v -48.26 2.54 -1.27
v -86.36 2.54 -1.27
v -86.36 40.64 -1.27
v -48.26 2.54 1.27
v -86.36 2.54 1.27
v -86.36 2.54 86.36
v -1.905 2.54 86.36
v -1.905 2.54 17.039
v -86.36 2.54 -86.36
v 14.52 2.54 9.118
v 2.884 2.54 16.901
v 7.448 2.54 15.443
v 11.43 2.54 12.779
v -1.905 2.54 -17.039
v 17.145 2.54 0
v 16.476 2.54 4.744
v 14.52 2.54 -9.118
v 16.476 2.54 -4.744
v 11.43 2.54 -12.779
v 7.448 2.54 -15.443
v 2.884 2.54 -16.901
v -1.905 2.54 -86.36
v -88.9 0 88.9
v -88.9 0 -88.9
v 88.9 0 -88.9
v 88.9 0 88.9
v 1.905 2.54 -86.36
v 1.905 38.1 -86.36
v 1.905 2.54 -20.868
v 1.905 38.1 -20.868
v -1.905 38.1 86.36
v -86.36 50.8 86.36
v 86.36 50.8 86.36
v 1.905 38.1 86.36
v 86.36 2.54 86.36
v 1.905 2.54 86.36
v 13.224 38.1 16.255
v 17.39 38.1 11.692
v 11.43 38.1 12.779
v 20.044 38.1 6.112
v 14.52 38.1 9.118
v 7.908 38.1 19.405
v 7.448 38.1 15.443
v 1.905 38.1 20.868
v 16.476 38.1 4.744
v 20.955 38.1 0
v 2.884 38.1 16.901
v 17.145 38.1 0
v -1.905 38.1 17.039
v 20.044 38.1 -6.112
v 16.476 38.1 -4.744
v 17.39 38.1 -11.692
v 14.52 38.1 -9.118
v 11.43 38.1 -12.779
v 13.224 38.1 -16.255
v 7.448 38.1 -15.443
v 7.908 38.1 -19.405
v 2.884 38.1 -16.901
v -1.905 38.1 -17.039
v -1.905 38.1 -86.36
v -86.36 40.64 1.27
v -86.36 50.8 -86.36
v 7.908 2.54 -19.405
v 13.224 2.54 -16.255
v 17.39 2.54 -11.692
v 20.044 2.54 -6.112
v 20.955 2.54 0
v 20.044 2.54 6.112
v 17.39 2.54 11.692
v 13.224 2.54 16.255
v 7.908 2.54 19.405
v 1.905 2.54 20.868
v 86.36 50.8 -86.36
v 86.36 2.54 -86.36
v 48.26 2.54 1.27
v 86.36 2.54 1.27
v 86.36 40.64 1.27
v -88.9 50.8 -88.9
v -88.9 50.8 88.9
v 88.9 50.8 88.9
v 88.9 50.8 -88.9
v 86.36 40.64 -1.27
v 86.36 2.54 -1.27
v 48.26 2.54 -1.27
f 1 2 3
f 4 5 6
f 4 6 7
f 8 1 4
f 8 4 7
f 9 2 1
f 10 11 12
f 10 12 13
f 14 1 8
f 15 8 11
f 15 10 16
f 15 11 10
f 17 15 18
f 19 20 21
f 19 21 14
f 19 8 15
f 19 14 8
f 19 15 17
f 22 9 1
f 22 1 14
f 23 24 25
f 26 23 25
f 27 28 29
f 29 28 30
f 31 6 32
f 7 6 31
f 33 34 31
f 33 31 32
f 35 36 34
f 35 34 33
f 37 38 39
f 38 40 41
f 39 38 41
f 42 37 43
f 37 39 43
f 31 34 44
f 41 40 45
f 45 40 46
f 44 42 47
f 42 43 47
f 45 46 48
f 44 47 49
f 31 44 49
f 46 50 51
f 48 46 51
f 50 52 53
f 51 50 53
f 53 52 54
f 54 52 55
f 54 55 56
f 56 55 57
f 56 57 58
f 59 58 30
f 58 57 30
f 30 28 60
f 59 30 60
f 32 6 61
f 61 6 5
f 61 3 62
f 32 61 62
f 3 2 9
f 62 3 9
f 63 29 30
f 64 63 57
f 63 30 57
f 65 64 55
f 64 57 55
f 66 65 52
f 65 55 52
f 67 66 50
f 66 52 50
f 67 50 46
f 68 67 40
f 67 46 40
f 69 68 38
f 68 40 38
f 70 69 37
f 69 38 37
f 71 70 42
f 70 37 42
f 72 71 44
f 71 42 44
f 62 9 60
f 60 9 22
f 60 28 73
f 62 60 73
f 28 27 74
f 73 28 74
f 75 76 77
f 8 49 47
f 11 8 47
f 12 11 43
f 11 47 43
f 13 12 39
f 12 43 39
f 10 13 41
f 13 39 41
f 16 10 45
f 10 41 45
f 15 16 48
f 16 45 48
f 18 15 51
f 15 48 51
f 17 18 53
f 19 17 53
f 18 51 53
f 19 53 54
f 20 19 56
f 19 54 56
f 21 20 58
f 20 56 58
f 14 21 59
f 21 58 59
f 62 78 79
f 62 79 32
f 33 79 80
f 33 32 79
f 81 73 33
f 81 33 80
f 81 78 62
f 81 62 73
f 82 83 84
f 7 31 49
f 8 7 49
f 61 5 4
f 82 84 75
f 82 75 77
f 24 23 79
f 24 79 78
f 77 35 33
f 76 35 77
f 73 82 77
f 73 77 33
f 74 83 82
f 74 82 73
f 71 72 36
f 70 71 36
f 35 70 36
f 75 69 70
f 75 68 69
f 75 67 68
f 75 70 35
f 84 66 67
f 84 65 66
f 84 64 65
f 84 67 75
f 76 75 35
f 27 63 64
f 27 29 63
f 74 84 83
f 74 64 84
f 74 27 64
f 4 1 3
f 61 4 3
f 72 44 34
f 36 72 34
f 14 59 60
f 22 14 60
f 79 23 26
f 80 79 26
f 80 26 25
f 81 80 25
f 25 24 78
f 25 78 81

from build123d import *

# Parameters (mm, degrees)
SKETCH1_W           = 177.8
SKETCH1_H           = 177.8
BOSS_EXTRUDE1_DEPTH = 50.8
SHELL1_T            = -2.54
RIB3_START          = -1.27
RIB3_DEPTH          = 2.54
RIB7_REACH          = 133.37


# Read off the part's stored shape, not the designer's step: Rib3
with BuildPart() as part:
    # Sketch1 → Boss-Extrude1 (new body)
    with BuildSketch(Plane(origin=(0, 0, 0), x_dir=(1, 0, 0), z_dir=(0, 1, 0))):
        Rectangle(SKETCH1_W, SKETCH1_H)
    extrude(amount=BOSS_EXTRUDE1_DEPTH)

    # Shell1
    shell1_openings = [part.faces().sort_by_distance(p)[0] for p in [
        (0, 50.8, 0),
    ]]
    offset(amount=SHELL1_T, openings=shell1_openings, kind=Kind.INTERSECTION)

    # Rib3 outline → Rib3 (add)
    with BuildSketch(Plane.XY.offset(RIB3_START)):
        Polygon((-48.26, 2.54), (-86.36, 40.64), (-86.36, 2.54), align=None)
    rib3 = extrude(amount=RIB3_DEPTH)

    # Mirror1: Rib3 across plane
    add(rib3.mirror(Plane(origin=(0, 0, 0), x_dir=(0, 0, 1), z_dir=(1, 0, 0))))

    # Sketch5 walls → Rib7 (add, up to next)
    with BuildSketch(Plane(origin=(0, 38.1, 0), x_dir=(-1, 0, 0), z_dir=(0, -1, 0)), mode=Mode.PRIVATE) as rib7_sk1:
        with BuildLine():
            Line((-1.905, 218.729821496), (-1.905, 20.868229441))
            ThreePointArc((-1.905, 20.868229441), (-20.955, 0), (-1.905, -20.868229441))
            Line((-1.905, -20.868229441), (-1.905, -218.729821496))
            Line((-1.905, -218.729821496), (1.905, -218.729821496))
            Line((1.905, -218.729821496), (1.905, -17.038837989))
            ThreePointArc((1.905, -17.038837989), (-17.145, 0), (1.905, 17.038837989))
            Line((1.905, 17.038837989), (1.905, 218.729821496))
            Line((1.905, 218.729821496), (-1.905, 218.729821496))
        make_face()
    rib7_tool1 = extrude(rib7_sk1.sketch, amount=RIB7_REACH, mode=Mode.PRIVATE) - part.part
    add(rib7_tool1.solids().sort_by_distance((19.05, 38.1, 0))[0])


solid = part.part
